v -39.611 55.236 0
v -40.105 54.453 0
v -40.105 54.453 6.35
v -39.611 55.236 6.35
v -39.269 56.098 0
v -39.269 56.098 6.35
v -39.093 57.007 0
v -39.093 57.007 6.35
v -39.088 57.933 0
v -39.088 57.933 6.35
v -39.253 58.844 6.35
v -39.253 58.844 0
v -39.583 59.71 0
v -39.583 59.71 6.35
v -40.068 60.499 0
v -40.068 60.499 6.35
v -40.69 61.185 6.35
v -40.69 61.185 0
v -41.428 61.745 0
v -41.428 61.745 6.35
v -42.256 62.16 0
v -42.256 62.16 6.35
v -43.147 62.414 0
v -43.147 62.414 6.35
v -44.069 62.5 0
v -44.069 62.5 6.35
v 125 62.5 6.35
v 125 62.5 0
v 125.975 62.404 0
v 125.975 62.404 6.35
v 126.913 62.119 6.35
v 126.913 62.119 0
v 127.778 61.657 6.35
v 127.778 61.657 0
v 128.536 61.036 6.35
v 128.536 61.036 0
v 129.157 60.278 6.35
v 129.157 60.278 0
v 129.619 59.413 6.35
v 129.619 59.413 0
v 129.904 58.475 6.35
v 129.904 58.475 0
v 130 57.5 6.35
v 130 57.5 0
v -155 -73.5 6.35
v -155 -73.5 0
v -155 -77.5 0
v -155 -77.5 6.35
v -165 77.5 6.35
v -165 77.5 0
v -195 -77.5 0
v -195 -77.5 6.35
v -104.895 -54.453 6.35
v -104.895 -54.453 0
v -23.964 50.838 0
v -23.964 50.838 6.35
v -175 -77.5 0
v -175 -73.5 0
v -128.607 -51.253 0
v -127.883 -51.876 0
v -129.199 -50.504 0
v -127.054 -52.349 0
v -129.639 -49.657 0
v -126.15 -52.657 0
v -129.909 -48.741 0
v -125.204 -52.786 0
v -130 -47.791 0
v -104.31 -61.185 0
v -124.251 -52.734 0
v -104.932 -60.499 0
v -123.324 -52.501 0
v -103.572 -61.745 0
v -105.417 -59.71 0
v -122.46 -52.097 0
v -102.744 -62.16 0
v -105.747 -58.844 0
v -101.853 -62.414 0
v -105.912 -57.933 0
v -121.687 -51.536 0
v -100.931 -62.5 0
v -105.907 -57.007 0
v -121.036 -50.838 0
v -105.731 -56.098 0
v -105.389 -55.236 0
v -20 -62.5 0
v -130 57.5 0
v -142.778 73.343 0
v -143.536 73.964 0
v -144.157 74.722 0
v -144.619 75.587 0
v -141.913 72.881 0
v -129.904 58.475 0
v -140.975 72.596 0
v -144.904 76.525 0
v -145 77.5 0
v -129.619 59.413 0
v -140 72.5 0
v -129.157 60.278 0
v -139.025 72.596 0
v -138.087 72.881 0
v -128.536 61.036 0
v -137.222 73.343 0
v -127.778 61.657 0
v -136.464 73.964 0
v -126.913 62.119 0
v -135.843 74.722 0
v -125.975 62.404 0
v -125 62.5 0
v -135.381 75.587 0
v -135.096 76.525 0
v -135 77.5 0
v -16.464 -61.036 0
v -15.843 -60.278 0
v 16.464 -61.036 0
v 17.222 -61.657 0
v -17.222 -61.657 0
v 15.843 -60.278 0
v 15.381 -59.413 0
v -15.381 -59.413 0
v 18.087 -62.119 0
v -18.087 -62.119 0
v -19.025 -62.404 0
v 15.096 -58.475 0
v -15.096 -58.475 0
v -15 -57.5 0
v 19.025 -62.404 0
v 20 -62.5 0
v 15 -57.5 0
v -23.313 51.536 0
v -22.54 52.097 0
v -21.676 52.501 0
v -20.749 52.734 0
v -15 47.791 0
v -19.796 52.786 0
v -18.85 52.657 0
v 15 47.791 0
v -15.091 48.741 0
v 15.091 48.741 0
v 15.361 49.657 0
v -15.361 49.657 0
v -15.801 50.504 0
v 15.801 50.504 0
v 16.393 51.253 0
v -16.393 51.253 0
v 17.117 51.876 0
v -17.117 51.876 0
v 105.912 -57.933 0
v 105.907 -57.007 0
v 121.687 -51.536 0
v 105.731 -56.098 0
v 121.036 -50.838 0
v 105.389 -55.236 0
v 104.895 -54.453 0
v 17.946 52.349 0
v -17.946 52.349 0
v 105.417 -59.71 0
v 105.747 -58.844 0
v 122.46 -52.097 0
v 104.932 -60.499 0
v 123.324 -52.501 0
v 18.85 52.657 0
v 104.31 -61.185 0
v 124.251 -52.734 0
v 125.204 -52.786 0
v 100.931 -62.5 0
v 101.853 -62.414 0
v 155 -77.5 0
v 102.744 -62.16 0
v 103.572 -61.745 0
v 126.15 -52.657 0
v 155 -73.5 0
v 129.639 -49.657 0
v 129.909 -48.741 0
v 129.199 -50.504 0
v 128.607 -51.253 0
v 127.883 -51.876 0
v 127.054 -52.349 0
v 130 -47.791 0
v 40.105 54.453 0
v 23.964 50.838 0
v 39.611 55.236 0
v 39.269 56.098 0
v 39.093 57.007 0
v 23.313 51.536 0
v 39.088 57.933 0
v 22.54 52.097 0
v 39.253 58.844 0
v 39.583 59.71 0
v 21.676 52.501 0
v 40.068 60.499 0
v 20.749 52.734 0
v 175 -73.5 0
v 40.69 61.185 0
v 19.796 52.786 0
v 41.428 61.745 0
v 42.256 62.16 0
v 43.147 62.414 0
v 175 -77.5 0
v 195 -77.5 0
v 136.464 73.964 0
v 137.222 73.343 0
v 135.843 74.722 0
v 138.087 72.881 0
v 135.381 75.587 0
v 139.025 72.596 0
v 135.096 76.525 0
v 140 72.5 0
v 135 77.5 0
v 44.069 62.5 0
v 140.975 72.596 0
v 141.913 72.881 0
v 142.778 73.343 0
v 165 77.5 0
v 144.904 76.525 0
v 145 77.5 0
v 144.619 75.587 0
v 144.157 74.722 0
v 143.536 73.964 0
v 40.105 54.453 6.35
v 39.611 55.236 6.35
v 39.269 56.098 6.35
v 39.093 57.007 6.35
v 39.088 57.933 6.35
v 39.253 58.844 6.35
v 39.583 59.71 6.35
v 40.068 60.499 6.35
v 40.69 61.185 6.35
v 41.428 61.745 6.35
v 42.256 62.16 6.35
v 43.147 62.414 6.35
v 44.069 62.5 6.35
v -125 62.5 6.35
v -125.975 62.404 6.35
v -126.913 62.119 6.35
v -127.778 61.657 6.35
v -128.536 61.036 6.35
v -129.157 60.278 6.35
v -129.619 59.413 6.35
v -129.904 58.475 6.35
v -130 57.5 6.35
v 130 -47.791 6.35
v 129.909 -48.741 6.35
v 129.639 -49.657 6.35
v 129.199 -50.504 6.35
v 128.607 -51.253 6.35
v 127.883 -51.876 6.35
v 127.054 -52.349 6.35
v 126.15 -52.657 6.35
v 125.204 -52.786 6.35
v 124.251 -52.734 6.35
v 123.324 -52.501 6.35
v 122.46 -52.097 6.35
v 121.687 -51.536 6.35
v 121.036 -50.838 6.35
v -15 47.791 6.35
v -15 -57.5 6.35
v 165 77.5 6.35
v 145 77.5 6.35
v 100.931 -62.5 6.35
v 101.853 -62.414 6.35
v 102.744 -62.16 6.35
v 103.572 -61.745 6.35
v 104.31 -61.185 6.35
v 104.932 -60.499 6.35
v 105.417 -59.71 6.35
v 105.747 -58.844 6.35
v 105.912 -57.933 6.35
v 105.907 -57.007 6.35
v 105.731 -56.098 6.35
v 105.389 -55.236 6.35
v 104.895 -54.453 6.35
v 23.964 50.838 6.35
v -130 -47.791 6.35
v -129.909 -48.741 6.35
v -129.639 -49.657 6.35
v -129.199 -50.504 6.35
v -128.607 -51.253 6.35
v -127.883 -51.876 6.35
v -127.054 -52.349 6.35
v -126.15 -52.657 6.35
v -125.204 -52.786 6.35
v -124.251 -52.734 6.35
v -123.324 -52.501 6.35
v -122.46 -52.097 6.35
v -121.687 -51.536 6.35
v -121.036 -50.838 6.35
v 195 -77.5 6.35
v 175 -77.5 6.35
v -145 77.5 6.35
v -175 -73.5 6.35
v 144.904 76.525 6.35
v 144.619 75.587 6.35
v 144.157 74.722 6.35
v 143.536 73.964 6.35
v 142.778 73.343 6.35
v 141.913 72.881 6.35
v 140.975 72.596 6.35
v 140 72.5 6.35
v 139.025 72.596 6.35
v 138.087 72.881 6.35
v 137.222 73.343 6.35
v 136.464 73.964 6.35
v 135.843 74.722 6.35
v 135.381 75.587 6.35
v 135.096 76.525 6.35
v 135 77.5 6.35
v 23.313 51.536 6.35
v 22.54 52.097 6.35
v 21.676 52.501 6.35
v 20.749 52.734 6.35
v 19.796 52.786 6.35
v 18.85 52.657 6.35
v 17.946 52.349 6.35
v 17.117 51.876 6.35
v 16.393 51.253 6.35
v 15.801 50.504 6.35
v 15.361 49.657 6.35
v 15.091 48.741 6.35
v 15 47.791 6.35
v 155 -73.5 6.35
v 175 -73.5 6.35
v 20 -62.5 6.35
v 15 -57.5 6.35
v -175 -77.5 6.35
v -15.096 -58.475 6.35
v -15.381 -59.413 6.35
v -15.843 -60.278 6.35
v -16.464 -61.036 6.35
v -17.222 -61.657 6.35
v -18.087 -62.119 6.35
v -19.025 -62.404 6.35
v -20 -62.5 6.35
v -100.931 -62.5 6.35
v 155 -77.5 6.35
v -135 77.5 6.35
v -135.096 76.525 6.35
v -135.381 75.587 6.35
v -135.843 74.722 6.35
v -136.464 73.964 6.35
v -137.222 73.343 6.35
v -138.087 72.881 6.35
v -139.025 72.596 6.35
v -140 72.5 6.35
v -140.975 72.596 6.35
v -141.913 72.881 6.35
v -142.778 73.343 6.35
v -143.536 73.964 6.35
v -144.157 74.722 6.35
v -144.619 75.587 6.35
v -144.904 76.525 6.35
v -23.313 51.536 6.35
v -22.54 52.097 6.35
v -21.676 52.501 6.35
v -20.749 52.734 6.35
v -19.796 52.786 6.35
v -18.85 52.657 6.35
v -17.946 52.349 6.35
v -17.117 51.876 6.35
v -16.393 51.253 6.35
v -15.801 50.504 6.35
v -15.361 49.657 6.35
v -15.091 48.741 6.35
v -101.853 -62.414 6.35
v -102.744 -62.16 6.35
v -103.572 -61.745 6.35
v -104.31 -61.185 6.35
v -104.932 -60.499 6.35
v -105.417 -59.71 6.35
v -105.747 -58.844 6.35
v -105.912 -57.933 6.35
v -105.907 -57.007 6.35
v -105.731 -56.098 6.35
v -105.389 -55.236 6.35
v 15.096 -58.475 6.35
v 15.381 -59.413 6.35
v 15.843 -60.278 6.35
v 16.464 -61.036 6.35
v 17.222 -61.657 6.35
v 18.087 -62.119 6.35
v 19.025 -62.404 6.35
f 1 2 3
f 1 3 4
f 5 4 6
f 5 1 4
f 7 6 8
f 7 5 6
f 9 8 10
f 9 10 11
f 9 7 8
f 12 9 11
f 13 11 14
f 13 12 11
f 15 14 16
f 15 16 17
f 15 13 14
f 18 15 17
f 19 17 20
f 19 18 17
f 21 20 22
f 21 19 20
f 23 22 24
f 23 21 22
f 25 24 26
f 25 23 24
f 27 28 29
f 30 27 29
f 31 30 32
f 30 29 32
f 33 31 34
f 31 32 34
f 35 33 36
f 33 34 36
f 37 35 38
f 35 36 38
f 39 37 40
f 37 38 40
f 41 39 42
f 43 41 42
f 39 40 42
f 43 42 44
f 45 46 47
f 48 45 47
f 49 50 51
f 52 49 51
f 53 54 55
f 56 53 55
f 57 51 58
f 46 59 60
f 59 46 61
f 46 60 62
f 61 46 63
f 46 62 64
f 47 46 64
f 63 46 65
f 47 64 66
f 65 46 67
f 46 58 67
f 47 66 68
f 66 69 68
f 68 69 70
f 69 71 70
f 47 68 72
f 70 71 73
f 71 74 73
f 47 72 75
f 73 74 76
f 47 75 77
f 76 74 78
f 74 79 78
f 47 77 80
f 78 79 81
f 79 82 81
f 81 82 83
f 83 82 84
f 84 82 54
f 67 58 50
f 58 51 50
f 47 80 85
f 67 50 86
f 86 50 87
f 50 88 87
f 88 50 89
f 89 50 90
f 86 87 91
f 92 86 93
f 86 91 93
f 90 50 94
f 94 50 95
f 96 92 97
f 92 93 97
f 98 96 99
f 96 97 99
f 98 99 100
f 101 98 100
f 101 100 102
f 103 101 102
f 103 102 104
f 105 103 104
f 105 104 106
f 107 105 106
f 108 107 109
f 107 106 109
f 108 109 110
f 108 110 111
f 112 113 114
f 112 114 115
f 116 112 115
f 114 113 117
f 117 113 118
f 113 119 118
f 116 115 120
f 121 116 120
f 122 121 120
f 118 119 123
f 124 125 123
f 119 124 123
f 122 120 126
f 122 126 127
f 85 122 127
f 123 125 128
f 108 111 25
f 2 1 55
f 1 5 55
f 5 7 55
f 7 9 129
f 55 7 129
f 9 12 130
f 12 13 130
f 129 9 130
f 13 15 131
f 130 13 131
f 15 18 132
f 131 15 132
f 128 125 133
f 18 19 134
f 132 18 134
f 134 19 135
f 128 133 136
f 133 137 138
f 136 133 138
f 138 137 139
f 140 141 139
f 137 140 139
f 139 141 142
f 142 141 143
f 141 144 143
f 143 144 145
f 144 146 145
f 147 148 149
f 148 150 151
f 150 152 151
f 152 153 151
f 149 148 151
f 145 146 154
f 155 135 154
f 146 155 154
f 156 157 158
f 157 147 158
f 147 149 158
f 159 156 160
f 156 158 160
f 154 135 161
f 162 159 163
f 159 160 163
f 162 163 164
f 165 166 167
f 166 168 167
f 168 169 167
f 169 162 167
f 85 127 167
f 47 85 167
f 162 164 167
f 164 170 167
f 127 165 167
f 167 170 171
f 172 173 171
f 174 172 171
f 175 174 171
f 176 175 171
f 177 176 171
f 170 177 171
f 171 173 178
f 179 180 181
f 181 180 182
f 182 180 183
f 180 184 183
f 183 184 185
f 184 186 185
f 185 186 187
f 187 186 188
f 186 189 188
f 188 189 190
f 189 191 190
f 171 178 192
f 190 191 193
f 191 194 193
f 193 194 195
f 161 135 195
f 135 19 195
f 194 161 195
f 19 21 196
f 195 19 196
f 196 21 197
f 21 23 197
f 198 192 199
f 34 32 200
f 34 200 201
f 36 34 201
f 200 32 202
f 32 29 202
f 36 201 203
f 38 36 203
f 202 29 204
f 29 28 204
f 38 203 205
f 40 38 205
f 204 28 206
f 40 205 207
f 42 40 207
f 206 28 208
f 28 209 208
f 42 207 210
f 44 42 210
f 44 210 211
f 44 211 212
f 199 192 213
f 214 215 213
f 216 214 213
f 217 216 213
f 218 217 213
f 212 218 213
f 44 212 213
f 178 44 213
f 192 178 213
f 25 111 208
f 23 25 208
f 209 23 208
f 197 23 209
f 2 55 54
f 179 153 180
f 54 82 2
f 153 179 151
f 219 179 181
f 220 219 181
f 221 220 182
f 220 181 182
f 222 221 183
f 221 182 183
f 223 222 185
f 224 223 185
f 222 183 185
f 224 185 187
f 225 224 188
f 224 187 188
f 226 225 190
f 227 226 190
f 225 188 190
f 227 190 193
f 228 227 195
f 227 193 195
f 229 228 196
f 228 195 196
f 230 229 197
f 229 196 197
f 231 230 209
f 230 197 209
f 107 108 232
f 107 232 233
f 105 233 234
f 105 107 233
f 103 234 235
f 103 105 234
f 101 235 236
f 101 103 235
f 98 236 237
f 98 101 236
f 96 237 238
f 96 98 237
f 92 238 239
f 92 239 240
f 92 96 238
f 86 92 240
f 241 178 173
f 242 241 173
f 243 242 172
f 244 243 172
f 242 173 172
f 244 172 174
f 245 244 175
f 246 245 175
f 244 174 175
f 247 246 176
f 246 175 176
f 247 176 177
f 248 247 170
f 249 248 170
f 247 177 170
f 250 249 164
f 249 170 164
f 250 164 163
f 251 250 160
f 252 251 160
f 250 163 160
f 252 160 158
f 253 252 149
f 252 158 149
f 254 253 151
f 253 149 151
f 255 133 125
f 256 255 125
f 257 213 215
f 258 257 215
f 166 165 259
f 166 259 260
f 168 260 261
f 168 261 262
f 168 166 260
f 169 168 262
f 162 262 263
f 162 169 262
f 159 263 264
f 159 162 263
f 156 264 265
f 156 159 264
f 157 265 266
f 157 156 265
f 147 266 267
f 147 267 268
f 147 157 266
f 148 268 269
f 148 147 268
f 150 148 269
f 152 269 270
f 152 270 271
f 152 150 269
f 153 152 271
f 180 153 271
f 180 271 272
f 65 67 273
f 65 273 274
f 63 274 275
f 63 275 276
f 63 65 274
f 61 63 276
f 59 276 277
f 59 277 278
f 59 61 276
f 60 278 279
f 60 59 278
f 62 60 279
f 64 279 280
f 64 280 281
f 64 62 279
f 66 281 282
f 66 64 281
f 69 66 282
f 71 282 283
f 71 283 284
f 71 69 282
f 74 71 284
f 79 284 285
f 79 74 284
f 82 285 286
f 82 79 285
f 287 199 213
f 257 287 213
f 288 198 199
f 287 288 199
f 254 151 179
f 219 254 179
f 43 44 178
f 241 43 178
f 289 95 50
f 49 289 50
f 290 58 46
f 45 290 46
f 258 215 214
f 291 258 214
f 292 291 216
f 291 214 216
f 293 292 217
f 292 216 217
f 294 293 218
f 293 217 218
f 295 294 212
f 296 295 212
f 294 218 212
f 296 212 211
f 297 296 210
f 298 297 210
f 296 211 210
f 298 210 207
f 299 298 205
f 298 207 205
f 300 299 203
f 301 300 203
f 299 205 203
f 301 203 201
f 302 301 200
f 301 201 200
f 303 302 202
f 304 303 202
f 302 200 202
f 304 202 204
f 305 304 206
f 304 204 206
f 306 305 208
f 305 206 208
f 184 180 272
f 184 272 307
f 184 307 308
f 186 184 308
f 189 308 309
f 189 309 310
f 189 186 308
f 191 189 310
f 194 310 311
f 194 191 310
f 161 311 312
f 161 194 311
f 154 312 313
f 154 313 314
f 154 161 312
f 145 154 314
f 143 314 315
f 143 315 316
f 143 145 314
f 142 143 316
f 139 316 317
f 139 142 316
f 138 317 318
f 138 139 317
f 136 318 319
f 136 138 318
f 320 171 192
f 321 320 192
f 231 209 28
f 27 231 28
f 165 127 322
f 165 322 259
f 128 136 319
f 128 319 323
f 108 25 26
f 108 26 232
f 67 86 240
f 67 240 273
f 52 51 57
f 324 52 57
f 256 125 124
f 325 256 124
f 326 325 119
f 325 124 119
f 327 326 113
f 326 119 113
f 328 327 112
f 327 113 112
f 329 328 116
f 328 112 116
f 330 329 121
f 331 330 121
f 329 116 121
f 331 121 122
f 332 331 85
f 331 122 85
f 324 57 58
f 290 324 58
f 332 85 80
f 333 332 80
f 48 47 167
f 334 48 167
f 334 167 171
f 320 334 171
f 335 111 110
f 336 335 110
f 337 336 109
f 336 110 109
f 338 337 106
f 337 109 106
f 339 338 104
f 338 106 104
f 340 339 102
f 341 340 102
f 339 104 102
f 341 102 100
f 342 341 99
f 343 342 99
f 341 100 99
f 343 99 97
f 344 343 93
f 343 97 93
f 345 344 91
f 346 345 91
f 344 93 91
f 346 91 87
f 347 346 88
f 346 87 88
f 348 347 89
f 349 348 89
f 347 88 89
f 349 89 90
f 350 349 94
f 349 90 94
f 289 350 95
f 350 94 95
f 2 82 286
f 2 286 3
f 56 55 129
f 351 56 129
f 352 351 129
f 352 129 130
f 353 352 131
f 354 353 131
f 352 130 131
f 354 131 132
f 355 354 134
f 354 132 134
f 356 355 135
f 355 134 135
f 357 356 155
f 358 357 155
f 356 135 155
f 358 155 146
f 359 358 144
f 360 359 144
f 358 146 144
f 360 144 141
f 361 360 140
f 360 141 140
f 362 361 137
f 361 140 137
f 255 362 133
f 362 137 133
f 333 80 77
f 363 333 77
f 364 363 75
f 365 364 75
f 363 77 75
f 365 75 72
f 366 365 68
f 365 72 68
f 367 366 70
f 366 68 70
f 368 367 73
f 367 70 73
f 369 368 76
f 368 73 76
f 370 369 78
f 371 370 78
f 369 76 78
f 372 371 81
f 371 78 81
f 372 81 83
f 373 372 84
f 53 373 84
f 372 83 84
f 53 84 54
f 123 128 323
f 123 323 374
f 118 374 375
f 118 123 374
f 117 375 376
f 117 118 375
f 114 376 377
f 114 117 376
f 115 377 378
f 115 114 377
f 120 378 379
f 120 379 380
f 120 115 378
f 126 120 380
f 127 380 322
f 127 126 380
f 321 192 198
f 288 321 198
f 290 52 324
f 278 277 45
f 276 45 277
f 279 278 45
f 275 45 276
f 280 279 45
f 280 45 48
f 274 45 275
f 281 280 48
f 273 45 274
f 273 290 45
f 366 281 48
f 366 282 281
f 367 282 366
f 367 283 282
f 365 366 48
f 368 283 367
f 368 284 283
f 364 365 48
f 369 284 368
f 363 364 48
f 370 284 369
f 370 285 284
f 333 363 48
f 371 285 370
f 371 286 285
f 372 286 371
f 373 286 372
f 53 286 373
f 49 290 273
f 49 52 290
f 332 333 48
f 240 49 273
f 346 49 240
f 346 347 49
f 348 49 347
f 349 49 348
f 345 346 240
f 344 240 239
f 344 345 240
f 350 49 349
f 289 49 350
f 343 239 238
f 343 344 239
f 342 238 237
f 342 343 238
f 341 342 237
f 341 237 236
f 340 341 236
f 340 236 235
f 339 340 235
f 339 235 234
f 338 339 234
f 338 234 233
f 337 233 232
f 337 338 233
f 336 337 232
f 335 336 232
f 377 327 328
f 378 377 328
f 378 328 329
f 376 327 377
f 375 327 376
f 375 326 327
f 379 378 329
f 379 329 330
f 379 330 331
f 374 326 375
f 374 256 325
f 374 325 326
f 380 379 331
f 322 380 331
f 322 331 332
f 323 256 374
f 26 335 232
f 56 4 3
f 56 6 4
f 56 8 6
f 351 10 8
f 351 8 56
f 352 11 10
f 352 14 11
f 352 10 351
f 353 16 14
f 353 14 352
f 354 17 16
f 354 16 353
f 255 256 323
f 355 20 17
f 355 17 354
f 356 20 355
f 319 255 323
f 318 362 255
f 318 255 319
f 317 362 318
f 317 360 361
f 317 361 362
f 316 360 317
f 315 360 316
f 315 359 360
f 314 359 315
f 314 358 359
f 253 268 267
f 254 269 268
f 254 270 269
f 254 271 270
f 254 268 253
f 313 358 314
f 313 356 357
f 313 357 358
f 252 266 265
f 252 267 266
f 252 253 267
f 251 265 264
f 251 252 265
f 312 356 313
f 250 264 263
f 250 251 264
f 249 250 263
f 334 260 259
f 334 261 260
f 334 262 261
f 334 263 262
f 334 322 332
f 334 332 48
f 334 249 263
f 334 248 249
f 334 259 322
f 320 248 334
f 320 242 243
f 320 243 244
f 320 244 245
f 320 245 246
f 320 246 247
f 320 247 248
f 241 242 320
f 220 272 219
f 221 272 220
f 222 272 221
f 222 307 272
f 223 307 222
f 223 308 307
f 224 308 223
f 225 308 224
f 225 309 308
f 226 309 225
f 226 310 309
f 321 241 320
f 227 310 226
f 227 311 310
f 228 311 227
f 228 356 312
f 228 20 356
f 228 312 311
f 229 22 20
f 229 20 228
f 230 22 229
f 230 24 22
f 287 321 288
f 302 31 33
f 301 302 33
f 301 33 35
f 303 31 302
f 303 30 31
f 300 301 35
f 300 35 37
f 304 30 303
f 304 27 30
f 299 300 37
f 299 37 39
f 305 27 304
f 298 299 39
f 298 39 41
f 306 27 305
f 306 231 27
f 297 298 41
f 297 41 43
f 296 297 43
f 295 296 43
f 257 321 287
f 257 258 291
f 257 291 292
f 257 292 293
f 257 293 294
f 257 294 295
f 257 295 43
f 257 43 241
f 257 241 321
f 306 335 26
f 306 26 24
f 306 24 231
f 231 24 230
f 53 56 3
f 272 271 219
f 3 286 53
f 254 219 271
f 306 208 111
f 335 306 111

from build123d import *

# Parameters (mm, degrees)
EXTRUDE1_DEPTH = 6.35


with BuildPart() as part:
    # Sketch1 → Extrude1 (new body)
    with BuildSketch(Plane.XY):
        with BuildLine():
            Line((-155, -77.5), (155, -77.5))
            Line((155, -77.5), (155, -73.5))
            Line((155, -73.5), (175, -73.5))
            Line((175, -73.5), (175, -77.5))
            Line((175, -77.5), (195, -77.5))
            Line((195, -77.5), (165, 77.5))
            Line((165, 77.5), (145, 77.5))
            ThreePointArc((145, 77.5), (140, 72.5), (135, 77.5))
            Line((135, 77.5), (-135, 77.5))
            ThreePointArc((-135, 77.5), (-140, 72.5), (-145, 77.5))
            Line((-145, 77.5), (-165, 77.5))
            Line((-165, 77.5), (-195, -77.5))
            Line((-195, -77.5), (-175, -77.5))
            Line((-175, -77.5), (-175, -73.5))
            Line((-175, -73.5), (-155, -73.5))
            Line((-155, -73.5), (-155, -77.5))
        make_face()
        with BuildLine():
            Line((-130, 57.5), (-130, -47.790537842))
            ThreePointArc((-130, -47.790537842), (-126.609162538, -52.524520935), (-121.03576163, -50.837637143))
            Line((-121.03576163, -50.837637143), (-40.104522322, 54.4529007))
            ThreePointArc((-40.104522322, 54.4529007), (-39.583479402, 59.709581804), (-44.068760692, 62.5))
            Line((-44.068760692, 62.5), (-125, 62.5))
            ThreePointArc((-125, 62.5), (-128.535533906, 61.035533906), (-130, 57.5))
        make_face(mode=Mode.SUBTRACT)
        with BuildLine():
            Line((-104.895477678, -54.4529007), (-23.96423837, 50.837637143))
            ThreePointArc((-23.96423837, 50.837637143), (-18.390837462, 52.524520935), (-15, 47.790537842))
            Line((-15, 47.790537842), (-15, -57.5))
            ThreePointArc((-15, -57.5), (-16.464466094, -61.035533906), (-20, -62.5))
            Line((-20, -62.5), (-100.931239308, -62.5))
            ThreePointArc((-100.931239308, -62.5), (-105.416520598, -59.709581804), (-104.895477678, -54.4529007))
        make_face(mode=Mode.SUBTRACT)
        with BuildLine():
            Line((20, -62.5), (100.931239308, -62.5))
            ThreePointArc((100.931239308, -62.5), (105.416520598, -59.709581804), (104.895477678, -54.4529007))
            Line((104.895477678, -54.4529007), (23.96423837, 50.837637143))
            ThreePointArc((23.96423837, 50.837637143), (18.390837462, 52.524520935), (15, 47.790537842))
            Line((15, 47.790537842), (15, -57.5))
            ThreePointArc((15, -57.5), (16.464466094, -61.035533906), (20, -62.5))
        make_face(mode=Mode.SUBTRACT)
        with BuildLine():
            Line((44.068760692, 62.5), (125, 62.5))
            ThreePointArc((125, 62.5), (128.535533906, 61.035533906), (130, 57.5))
            Line((130, 57.5), (130, -47.790537842))
            ThreePointArc((130, -47.790537842), (126.609162538, -52.524520935), (121.03576163, -50.837637143))
            Line((121.03576163, -50.837637143), (40.104522322, 54.4529007))
            ThreePointArc((40.104522322, 54.4529007), (39.583479402, 59.709581804), (44.068760692, 62.5))
        make_face(mode=Mode.SUBTRACT)
    extrude(amount=EXTRUDE1_DEPTH)


solid = part.part
